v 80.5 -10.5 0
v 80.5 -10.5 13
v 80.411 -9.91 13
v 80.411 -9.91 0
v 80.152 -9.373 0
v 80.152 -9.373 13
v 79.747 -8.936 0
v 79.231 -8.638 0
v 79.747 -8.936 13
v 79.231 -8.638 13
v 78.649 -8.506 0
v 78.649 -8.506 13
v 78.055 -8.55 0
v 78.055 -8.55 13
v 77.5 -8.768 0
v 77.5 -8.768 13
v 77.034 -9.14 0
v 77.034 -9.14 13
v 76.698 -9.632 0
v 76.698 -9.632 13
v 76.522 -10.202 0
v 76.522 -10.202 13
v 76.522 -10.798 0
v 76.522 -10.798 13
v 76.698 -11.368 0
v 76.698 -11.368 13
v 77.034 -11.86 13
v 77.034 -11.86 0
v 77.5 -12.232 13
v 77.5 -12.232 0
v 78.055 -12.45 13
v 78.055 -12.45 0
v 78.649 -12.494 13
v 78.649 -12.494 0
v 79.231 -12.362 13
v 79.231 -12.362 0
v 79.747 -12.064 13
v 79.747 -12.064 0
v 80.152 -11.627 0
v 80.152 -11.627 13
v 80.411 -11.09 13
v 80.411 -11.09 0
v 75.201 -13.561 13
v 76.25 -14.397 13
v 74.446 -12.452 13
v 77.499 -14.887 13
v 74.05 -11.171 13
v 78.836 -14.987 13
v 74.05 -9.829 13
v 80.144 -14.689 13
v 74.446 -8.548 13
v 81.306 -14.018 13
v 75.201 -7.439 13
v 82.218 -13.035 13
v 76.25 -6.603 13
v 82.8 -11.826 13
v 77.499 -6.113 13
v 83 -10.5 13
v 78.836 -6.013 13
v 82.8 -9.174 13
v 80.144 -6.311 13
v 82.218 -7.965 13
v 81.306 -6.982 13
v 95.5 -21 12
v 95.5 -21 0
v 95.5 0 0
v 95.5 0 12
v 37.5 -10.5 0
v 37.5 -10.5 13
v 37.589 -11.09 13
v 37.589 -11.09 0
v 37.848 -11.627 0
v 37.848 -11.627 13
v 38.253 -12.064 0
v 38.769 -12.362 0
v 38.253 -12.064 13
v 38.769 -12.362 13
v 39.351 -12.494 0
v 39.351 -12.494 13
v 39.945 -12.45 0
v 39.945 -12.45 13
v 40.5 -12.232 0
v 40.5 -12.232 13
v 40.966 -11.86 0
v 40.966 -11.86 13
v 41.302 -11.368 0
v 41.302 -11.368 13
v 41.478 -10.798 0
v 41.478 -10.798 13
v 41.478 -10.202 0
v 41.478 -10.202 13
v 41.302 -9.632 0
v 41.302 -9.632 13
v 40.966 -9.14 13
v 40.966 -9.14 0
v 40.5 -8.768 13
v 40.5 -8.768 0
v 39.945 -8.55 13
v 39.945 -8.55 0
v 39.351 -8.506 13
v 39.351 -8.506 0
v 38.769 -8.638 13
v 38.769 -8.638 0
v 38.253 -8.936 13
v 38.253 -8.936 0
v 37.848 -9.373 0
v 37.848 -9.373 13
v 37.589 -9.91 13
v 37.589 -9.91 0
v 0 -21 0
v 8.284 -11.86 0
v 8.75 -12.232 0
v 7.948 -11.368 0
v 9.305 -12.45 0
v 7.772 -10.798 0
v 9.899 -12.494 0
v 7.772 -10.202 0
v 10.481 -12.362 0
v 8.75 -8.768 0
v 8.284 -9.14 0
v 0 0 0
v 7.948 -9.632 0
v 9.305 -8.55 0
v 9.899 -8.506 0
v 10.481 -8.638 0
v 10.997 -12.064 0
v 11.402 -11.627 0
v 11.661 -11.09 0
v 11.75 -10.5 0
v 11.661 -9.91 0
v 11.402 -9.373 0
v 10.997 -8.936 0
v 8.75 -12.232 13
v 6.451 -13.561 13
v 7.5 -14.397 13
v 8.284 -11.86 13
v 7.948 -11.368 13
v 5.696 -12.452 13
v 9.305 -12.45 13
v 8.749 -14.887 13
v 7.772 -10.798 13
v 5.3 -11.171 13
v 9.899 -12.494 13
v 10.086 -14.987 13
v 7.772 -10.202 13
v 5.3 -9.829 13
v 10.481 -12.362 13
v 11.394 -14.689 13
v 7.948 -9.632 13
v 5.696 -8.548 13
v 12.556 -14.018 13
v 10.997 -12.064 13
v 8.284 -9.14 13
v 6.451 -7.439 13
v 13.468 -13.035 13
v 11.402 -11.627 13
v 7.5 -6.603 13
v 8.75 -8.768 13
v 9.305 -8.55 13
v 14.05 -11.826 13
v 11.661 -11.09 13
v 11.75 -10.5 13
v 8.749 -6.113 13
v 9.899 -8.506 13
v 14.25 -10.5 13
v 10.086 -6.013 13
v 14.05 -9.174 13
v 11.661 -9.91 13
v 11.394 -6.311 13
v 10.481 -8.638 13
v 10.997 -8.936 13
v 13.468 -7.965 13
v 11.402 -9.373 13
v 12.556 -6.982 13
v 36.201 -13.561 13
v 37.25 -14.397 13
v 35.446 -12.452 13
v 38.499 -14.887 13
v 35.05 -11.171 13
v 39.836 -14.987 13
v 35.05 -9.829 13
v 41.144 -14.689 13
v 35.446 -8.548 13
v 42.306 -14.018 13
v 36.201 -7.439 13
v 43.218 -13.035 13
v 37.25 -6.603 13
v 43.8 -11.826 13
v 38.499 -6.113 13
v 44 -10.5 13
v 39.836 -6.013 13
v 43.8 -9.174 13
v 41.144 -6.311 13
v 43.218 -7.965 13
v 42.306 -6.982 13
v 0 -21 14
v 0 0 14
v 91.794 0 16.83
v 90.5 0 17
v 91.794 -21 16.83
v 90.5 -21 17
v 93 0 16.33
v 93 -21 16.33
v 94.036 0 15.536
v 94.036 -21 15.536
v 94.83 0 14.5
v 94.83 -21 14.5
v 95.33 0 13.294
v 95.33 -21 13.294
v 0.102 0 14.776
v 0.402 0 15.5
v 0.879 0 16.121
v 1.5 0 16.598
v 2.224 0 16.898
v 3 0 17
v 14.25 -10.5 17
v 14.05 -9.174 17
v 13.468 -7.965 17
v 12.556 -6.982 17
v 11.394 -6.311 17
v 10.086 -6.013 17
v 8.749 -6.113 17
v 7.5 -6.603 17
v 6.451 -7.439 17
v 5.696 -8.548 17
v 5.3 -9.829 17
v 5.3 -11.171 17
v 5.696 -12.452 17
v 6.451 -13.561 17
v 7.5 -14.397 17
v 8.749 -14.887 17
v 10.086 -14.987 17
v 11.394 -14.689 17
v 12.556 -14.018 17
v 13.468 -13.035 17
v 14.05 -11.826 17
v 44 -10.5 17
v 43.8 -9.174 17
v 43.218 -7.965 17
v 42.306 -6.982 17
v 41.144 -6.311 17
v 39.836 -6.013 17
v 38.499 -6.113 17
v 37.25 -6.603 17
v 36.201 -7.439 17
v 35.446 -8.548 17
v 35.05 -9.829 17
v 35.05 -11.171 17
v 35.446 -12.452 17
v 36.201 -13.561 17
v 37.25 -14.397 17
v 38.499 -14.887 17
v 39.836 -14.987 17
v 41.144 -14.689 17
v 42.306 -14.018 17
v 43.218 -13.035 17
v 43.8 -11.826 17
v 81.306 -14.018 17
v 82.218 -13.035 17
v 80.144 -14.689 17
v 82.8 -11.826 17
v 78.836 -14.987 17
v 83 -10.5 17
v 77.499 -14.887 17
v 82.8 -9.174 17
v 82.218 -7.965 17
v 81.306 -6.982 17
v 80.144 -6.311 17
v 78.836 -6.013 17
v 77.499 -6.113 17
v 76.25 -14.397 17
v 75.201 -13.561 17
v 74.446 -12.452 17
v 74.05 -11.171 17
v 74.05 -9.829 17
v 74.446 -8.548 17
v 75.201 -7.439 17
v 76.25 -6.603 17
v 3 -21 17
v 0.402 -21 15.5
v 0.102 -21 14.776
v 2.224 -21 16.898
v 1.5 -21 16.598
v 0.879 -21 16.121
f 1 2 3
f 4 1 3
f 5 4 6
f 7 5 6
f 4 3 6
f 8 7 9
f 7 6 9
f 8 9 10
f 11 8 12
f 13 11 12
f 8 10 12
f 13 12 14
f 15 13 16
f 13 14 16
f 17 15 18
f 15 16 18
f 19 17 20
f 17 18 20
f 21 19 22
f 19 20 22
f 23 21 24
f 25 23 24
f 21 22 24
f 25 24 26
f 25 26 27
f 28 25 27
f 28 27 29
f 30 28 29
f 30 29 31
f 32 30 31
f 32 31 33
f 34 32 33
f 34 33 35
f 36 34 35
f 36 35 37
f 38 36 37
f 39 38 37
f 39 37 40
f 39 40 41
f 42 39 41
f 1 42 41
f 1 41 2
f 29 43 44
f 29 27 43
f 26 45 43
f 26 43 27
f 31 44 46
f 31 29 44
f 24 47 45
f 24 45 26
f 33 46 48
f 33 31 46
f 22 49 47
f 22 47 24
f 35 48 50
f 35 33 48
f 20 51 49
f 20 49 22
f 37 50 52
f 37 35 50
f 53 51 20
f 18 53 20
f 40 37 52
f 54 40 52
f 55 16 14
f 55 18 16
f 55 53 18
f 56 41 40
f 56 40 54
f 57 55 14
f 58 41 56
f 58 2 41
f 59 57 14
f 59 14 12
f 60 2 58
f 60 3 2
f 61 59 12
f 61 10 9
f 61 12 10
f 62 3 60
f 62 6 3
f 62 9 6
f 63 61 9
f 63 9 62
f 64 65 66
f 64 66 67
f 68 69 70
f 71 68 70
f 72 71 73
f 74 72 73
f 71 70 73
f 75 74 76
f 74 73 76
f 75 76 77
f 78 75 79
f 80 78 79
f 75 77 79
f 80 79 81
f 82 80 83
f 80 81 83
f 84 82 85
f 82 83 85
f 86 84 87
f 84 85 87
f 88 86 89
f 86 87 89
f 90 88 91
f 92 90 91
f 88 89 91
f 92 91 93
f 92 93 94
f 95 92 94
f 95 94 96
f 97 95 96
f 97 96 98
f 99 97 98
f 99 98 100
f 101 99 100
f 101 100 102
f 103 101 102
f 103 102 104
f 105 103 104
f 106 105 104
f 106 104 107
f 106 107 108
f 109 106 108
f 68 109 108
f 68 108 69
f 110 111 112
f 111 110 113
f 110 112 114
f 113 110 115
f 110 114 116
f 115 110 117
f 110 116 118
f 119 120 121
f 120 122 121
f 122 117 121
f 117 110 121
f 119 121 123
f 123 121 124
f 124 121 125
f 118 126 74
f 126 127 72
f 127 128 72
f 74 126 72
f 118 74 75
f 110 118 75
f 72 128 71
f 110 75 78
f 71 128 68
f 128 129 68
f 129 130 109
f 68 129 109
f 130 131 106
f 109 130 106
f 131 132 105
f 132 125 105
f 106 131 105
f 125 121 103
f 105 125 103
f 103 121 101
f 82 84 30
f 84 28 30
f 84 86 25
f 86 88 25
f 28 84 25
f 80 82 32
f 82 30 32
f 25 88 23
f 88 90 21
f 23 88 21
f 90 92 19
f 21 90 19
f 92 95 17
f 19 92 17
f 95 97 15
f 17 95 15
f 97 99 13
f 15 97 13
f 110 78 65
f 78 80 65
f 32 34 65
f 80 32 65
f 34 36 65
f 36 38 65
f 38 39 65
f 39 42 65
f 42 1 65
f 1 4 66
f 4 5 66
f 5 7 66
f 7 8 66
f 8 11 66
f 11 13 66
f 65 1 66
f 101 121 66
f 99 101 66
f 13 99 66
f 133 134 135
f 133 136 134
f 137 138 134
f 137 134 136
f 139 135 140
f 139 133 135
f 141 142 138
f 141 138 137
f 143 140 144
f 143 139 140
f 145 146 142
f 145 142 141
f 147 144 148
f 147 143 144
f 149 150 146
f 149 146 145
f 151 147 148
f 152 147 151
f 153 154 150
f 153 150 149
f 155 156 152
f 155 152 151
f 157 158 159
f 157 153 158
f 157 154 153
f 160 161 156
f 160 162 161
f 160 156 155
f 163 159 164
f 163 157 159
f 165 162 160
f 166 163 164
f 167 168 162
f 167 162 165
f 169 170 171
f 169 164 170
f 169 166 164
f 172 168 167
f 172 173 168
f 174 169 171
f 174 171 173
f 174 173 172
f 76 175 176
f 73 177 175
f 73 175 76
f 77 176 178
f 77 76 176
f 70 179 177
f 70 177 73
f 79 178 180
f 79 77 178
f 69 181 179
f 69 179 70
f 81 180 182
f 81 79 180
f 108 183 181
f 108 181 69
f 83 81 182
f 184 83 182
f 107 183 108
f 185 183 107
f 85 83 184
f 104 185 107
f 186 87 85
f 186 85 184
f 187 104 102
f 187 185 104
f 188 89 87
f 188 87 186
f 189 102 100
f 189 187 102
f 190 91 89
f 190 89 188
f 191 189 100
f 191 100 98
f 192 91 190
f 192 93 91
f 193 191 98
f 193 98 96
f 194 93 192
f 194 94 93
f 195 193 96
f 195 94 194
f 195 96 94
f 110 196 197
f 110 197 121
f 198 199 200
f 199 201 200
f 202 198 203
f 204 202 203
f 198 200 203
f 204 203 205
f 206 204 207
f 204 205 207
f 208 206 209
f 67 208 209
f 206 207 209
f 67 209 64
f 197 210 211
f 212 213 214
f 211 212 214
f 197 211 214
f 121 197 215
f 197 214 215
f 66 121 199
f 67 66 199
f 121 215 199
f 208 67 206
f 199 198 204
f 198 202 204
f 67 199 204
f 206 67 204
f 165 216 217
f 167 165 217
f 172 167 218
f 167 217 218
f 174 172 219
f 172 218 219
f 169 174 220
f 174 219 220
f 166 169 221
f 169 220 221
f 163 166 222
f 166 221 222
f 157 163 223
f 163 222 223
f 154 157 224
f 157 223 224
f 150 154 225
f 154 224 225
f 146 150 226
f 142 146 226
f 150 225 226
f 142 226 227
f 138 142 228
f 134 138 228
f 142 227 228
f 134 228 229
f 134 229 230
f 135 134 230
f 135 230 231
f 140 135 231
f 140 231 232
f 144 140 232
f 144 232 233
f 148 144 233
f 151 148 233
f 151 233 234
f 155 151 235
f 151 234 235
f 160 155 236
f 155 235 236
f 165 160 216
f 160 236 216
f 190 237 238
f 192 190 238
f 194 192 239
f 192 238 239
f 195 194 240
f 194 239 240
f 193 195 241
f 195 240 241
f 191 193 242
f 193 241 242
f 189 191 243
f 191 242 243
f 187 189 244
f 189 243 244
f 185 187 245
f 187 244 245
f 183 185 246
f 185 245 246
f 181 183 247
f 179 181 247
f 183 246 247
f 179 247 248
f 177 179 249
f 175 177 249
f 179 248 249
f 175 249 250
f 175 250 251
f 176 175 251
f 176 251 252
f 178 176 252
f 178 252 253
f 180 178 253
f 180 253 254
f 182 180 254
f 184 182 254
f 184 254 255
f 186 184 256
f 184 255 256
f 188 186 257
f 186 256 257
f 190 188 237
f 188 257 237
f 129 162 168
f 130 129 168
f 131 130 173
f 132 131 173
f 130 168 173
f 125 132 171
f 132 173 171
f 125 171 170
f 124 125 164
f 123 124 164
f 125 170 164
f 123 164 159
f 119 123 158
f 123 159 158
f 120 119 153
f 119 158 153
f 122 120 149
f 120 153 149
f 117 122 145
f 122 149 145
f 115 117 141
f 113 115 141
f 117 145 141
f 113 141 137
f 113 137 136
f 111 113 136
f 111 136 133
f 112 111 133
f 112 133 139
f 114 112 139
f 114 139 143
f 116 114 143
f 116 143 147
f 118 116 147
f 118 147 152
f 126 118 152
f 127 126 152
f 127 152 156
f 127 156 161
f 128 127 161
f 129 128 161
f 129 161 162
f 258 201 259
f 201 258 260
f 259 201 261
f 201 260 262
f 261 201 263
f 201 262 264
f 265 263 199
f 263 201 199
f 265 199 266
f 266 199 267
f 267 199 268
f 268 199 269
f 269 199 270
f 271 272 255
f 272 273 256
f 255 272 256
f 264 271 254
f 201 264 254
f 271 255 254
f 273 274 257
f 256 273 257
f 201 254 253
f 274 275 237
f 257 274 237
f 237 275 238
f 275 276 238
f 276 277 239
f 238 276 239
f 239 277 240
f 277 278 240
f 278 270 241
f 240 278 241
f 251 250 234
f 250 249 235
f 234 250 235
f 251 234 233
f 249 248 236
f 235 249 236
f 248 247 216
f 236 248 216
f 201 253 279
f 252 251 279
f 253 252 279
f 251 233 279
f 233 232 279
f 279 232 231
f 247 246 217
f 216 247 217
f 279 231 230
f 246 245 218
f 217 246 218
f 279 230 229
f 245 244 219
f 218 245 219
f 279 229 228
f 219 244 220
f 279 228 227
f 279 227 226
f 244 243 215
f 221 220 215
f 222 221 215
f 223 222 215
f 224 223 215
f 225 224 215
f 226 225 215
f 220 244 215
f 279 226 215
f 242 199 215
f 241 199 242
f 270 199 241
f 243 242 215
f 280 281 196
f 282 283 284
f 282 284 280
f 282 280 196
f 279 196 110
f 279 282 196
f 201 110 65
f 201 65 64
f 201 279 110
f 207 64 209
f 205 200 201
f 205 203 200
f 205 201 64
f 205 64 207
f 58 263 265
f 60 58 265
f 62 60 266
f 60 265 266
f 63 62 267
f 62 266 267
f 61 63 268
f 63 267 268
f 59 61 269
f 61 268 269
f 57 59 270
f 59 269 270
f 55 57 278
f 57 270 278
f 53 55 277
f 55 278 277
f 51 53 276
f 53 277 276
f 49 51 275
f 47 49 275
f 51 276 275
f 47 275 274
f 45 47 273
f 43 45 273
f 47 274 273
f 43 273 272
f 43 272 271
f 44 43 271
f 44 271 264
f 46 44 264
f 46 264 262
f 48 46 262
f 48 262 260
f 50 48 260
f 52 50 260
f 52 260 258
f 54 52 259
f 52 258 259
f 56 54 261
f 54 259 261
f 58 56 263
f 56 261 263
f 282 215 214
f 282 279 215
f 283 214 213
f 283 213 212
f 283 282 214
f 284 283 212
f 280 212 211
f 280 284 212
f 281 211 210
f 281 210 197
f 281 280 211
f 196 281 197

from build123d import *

# Parameters (mm, degrees)
F1_DEPTH = 21
F2_R     = 5
F3_R     = 2
F4_DEPTH = 25
F5_R     = 4.5
F6_DEPTH = 4
F7_R     = 3


with BuildPart() as f1:
    # F0 (on Front) → F1 (new body)
    with BuildSketch(Plane.XZ):
        Polygon((95.5, 17), (6.891753, 17), (0, 17), (0, 0), (95.5, 0), align=None)
    extrude(amount=F1_DEPTH)

    # F2
    f2_edges = [f1.edges().sort_by_distance(p)[0] for p in [
        (95.5, -10.5, 17),
    ]]
    fillet(f2_edges, radius=F2_R)

    # F3 (on face) → F4 (cut)
    with BuildSketch(Plane.XY.offset(17)):
        with BuildLine():
            ThreePointArc((41.5, -10.5), (39.5, -8.5), (37.5, -10.5))
            ThreePointArc((37.5, -10.5), (39.5, -12.5), (41.5, -10.5))
        make_face()
        with BuildLine():
            ThreePointArc((7.75, -10.5), (9.75, -12.5), (11.75, -10.5))
            Line((11.75, -10.5), (7.75, -10.5))
        make_face()
        with BuildLine():
            Line((7.75, -10.5), (11.75, -10.5))
            ThreePointArc((11.75, -10.5), (9.75, -8.5), (7.75, -10.5))
        make_face()
        with Locations((78.5, -10.5)):
            Circle(F3_R)
    extrude(amount=-F4_DEPTH, mode=Mode.SUBTRACT)

    # F5 (on face) → F6 (cut)
    with BuildSketch(Plane.XY.offset(17)):
        with Locations((9.75, -10.5)):
            Circle(F5_R)
        with Locations((39.5, -10.5)):
            Circle(F5_R)
        with Locations((78.5, -10.5)):
            Circle(F5_R)
    extrude(amount=-F6_DEPTH, mode=Mode.SUBTRACT)

    # F7
    f7_edges = [f1.edges().sort_by_distance(p)[0] for p in [
        (0, -10.5, 17),
    ]]
    fillet(f7_edges, radius=F7_R)


solid = f1.part
